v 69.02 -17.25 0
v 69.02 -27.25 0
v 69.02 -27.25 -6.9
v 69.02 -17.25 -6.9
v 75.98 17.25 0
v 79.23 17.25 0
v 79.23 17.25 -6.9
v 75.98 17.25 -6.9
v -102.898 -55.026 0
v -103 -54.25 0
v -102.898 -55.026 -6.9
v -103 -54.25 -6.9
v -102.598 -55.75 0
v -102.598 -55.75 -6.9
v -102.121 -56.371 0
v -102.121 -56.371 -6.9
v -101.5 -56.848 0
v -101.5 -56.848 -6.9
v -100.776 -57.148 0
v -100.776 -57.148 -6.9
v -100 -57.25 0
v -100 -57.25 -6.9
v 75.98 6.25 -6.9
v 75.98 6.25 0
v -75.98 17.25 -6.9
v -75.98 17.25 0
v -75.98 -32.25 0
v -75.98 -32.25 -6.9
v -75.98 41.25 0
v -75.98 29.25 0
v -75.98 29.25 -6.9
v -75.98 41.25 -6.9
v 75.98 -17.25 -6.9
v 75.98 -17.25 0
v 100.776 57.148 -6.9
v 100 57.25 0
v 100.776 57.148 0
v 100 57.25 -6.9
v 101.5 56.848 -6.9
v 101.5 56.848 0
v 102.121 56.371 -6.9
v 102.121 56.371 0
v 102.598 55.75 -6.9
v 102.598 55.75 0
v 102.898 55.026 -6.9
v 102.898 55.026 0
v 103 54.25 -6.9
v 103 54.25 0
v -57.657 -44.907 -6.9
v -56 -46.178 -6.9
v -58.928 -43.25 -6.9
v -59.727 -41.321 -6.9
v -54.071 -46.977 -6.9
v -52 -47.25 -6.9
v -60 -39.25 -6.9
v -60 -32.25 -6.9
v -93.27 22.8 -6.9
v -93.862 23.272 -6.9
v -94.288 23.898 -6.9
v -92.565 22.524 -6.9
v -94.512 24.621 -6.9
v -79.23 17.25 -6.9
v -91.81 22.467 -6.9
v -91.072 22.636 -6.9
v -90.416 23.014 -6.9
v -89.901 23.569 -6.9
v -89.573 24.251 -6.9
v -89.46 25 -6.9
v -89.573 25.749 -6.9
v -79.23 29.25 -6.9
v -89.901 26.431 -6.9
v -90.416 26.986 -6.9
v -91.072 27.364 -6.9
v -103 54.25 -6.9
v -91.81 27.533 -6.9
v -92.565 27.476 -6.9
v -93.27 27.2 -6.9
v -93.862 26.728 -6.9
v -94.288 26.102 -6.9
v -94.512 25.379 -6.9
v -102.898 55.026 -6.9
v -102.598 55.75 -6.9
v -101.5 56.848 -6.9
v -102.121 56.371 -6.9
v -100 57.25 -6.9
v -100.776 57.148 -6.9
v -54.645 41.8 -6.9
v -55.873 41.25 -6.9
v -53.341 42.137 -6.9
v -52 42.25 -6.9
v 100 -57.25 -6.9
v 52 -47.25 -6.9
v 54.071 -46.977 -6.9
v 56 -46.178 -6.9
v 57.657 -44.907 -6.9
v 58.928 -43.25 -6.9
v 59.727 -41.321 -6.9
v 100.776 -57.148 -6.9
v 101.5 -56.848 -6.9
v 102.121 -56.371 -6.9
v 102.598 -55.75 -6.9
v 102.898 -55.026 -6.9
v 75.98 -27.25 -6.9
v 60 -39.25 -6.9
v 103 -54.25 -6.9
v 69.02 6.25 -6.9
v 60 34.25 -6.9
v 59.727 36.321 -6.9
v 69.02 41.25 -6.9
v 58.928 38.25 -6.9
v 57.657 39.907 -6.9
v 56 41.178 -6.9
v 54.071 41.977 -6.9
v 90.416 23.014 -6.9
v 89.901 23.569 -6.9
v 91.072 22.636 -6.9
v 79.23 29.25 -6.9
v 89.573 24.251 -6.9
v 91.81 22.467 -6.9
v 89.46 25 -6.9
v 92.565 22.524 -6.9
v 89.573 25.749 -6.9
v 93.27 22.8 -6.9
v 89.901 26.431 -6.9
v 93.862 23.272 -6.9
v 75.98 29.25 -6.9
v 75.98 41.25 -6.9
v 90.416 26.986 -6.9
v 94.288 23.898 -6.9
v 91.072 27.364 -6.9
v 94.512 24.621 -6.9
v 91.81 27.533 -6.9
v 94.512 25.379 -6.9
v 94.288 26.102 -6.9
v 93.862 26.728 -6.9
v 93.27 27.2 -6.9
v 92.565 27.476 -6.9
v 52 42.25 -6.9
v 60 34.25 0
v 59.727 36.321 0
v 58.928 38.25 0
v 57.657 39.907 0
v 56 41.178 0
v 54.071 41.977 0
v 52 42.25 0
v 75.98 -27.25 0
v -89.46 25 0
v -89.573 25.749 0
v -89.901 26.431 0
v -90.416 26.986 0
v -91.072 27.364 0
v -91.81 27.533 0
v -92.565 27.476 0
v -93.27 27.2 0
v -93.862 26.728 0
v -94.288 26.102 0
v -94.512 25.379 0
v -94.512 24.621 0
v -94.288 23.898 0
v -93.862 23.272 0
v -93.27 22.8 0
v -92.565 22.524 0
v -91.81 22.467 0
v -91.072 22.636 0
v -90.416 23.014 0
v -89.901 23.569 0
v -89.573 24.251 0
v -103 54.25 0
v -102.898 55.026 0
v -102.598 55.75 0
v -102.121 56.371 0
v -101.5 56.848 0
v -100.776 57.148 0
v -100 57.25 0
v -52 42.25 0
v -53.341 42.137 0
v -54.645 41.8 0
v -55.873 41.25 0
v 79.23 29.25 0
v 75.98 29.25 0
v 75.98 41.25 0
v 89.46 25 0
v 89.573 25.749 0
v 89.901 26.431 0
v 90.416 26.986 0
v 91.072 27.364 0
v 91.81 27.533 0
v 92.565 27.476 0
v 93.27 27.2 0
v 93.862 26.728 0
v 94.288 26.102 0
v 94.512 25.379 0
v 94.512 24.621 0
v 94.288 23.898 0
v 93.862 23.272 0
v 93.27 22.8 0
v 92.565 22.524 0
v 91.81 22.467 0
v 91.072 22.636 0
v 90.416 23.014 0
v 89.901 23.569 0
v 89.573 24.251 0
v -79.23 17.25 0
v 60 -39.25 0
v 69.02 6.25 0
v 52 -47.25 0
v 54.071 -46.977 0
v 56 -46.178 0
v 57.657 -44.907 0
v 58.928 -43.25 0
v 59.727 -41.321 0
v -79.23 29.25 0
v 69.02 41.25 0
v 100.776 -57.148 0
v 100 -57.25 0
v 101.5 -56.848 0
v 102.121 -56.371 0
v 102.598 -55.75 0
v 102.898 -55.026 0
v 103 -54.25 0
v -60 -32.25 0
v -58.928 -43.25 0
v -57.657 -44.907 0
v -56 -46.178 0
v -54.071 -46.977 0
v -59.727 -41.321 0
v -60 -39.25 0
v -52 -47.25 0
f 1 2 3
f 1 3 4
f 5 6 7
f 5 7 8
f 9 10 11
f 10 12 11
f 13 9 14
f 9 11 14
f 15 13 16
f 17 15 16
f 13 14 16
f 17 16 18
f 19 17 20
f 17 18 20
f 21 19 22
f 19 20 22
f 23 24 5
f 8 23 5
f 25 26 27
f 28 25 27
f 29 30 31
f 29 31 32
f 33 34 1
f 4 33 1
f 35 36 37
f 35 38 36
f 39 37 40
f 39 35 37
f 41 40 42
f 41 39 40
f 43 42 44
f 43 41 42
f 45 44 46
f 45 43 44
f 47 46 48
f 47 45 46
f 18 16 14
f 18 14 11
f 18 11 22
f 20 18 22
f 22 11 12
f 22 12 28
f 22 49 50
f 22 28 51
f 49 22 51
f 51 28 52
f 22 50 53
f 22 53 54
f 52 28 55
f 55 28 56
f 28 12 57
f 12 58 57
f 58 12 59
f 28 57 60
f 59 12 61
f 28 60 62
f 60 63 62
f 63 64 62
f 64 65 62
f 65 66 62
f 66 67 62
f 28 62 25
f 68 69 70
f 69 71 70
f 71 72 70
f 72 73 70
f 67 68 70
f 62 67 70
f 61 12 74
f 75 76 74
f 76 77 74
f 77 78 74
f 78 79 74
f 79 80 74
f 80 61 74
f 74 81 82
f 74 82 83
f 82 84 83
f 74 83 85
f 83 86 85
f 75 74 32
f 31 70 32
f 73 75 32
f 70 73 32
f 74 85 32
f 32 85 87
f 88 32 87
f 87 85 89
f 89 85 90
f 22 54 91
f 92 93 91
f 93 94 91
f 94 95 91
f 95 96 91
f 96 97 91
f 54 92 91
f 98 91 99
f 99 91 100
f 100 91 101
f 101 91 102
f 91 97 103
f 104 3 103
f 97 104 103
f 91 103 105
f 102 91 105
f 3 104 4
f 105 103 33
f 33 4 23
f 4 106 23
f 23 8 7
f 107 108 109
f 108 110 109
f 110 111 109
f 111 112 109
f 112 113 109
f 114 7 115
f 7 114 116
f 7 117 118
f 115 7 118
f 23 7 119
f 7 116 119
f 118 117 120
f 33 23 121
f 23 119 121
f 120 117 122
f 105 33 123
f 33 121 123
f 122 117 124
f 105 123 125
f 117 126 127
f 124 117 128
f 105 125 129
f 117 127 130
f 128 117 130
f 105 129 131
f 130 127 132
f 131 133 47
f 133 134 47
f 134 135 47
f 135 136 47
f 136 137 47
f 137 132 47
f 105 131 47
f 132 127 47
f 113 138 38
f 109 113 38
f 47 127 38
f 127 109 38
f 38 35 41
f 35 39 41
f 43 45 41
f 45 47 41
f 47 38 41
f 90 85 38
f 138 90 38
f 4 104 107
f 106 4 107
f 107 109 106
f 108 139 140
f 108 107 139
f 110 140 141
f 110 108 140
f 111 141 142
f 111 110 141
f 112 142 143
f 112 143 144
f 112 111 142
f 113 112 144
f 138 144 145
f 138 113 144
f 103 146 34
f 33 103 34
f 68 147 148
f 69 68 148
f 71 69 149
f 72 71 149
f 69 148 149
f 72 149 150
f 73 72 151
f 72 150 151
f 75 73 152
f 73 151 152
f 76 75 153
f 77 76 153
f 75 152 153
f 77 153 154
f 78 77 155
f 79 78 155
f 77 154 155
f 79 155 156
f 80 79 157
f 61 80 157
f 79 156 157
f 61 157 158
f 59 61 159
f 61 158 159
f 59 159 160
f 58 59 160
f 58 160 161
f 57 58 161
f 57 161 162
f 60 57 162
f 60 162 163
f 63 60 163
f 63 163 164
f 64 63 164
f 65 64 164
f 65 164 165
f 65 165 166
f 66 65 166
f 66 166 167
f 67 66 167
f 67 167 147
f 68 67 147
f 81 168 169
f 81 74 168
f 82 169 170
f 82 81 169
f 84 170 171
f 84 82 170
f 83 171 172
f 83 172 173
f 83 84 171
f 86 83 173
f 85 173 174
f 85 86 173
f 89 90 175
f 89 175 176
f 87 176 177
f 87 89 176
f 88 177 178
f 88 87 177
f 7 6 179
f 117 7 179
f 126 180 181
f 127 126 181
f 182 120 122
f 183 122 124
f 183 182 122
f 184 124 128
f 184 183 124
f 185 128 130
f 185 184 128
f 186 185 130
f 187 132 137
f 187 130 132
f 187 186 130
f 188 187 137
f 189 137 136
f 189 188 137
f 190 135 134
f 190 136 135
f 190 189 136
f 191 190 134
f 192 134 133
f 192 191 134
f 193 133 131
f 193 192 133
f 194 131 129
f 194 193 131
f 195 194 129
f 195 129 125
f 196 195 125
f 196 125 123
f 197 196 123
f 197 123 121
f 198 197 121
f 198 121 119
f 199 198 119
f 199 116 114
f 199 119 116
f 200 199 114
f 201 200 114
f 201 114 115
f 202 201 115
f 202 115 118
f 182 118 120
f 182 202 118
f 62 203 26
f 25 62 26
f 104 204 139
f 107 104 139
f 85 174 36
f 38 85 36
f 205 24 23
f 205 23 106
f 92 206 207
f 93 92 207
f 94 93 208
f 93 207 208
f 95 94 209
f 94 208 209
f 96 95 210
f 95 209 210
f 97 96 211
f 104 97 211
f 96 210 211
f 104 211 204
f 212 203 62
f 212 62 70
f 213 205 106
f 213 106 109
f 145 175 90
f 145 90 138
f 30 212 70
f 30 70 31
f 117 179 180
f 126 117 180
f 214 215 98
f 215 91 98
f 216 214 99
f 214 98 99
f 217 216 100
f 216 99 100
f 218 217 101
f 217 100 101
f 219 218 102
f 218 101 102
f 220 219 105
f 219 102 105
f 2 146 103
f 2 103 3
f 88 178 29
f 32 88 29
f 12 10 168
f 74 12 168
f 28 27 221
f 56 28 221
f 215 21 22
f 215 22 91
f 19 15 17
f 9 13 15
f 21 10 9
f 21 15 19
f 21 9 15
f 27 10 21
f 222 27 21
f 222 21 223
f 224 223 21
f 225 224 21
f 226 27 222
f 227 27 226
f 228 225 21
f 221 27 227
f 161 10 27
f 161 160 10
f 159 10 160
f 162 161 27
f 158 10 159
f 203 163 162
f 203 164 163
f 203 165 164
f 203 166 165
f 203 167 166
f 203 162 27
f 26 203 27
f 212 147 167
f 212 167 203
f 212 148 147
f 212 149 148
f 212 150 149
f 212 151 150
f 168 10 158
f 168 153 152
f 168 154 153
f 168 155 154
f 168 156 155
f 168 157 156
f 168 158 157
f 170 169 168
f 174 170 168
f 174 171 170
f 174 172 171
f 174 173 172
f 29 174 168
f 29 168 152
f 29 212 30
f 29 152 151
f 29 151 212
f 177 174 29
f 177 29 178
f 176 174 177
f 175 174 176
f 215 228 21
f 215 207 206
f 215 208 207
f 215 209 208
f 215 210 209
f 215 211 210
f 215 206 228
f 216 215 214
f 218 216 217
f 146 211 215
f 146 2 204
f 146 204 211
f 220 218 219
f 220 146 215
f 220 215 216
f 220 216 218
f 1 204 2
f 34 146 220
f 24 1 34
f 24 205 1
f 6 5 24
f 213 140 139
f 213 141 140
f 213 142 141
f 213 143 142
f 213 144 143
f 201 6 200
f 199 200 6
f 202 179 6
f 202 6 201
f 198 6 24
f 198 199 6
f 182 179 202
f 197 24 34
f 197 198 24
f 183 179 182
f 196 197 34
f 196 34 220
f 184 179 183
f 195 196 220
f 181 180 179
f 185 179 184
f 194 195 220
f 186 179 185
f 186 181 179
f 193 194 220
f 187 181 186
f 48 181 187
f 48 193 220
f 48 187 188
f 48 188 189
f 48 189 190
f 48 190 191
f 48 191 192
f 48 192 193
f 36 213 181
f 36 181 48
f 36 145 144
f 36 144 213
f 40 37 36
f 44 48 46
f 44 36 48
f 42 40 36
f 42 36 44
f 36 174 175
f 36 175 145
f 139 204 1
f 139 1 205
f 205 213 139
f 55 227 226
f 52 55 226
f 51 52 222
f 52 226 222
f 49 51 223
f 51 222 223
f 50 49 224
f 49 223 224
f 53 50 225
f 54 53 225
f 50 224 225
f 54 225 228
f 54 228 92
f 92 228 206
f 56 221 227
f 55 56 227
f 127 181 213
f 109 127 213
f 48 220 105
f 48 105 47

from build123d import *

# Parameters (mm, degrees)
SKETCH1_W           = 206
SKETCH1_H           = 114.5
BOSS_EXTRUDE1_DEPTH = 6.9
SKETCH2_W           = 120
SKETCH2_H           = 88
CUT_EXTRUDE1_DEPTH  = 119.043095944
FILLET1_R           = 8
SKETCH7_R           = 2.54
CUT_EXTRUDE5_DEPTH  = 119.043095944
SKETCH9_W           = 6.96
SKETCH9_H           = 35
SKETCH9_H_2         = 10
CUT_EXTRUDE7_DEPTH  = 119.043095944
SKETCH11_W          = 3.25
SKETCH11_H          = 12
CUT_EXTRUDE8_DEPTH  = 119.043095944
FILLET2_R           = 3
SKETCH8_R           = 1.775
CUT_EXTRUDE6_DEPTH  = 119.043095944
SKETCH10_W          = 6.8
SKETCH10_H          = 3
BOSS_EXTRUDE3_DEPTH = 6.9
FILLET3_R           = 1.5
CUT_EXTRUDE9_DEPTH  = 120.526869364
CUT_EXTRUDE10_DEPTH = 119.043095944
SKETCH15_R          = 1.775
BOSS_EXTRUDE4_DEPTH = 6.9


with BuildPart() as part:
    # Sketch1 → Boss-Extrude1 (new body)
    with BuildSketch(Plane.XY):
        Rectangle(SKETCH1_W, SKETCH1_H)
    extrude(amount=-BOSS_EXTRUDE1_DEPTH)

    # Sketch2 → Cut-Extrude1 (cut, through all)
    with BuildSketch(Plane.XY):
        with Locations((0, -1.75)):
            Rectangle(SKETCH2_W, SKETCH2_H)
    extrude(amount=-CUT_EXTRUDE1_DEPTH, mode=Mode.SUBTRACT)

    # Fillet1
    fillet1_edges = [part.edges().sort_by_distance(p)[0] for p in [
        (-60, -45.75, -3.45),
        (-60, 42.25, -3.45),
        (60, 42.25, -3.45),
        (60, -45.75, -3.45),
    ]]
    fillet(fillet1_edges, radius=FILLET1_R)

    # Sketch7 → Cut-Extrude5 (cut, through all)
    with BuildSketch(Plane.XY):
        with Locations((-92, 25)):
            Circle(SKETCH7_R)
    cut_extrude5 = extrude(amount=-CUT_EXTRUDE5_DEPTH, mode=Mode.SUBTRACT)

    # Sketch9 → Cut-Extrude7 (cut, through all)
    with BuildSketch(Plane.XY):
        with Locations((-72.5, 23.75)):
            Rectangle(SKETCH9_W, SKETCH9_H)
        with Locations((-72.5, -22.25)):
            Rectangle(SKETCH9_W, SKETCH9_H_2)
    cut_extrude7 = extrude(amount=-CUT_EXTRUDE7_DEPTH, mode=Mode.SUBTRACT)

    # Sketch11 → Cut-Extrude8 (cut, through all)
    with BuildSketch(Plane.XY):
        with Locations((-77.605, 23.25)):
            Rectangle(SKETCH11_W, SKETCH11_H)
    cut_extrude8 = extrude(amount=-CUT_EXTRUDE8_DEPTH, mode=Mode.SUBTRACT)

    # Mirror2: Cut-Extrude5, Cut-Extrude7, Cut-Extrude8 across plane
    add(cut_extrude5.mirror(Plane(origin=(0, 0, 0), x_dir=(0, 0, 1), z_dir=(1, 0, 0))), mode=Mode.SUBTRACT)
    add(cut_extrude7.mirror(Plane(origin=(0, 0, 0), x_dir=(0, 0, 1), z_dir=(1, 0, 0))), mode=Mode.SUBTRACT)
    add(cut_extrude8.mirror(Plane(origin=(0, 0, 0), x_dir=(0, 0, 1), z_dir=(1, 0, 0))), mode=Mode.SUBTRACT)

    # Fillet2
    fillet2_edges = [part.edges().sort_by_distance(p)[0] for p in [
        (-103, 57.25, -3.45),
        (103, 57.25, -3.45),
        (103, -57.25, -3.45),
        (-103, -57.25, -3.45),
    ]]
    fillet(fillet2_edges, radius=FILLET2_R)

    # Sketch8 → Cut-Extrude6 (cut, through all)
    with BuildSketch(Plane.XY):
        with Locations((72, -36.75)):
            Circle(SKETCH8_R)
        with Locations((-72, -36.75)):
            Circle(SKETCH8_R)
    extrude(amount=-CUT_EXTRUDE6_DEPTH, mode=Mode.SUBTRACT)

    # Sketch10 → Boss-Extrude3 (add)
    with BuildSketch(Plane.XY):
        with Locations((-38.4, -58.75)):
            Rectangle(SKETCH10_W, SKETCH10_H)
        with Locations((38.4, -58.75)):
            Rectangle(SKETCH10_W, SKETCH10_H)
    extrude(amount=-BOSS_EXTRUDE3_DEPTH)

    # Fillet3
    fillet3_edges = [part.edges().sort_by_distance(p)[0] for p in [
        (-35, -60.25, -3.45),
        (-41.8, -60.25, -3.45),
        (35, -60.25, -3.45),
        (41.8, -60.25, -3.45),
    ]]
    fillet(fillet3_edges, radius=FILLET3_R)

    # Sketch13 → Cut-Extrude9 (cut, through all)
    with BuildSketch(Plane.XY):
        with BuildLine():
            Line((-40.3, -60.25), (-36.5, -60.25))
            ThreePointArc((-36.5, -60.25), (-35.439339828, -59.810660172), (-35, -58.75))
            Line((-35, -58.75), (-35, -57.25))
            Line((-35, -57.25), (-41.8, -57.25))
            Line((-41.8, -57.25), (-41.8, -58.75))
            ThreePointArc((-41.8, -58.75), (-41.360660172, -59.810660172), (-40.3, -60.25))
        make_face()
        with BuildLine():
            Line((35, -57.25), (35, -58.75))
            ThreePointArc((35, -58.75), (35.439339828, -59.810660172), (36.5, -60.25))
            Line((36.5, -60.25), (40.3, -60.25))
            ThreePointArc((40.3, -60.25), (41.360660172, -59.810660172), (41.8, -58.75))
            Line((41.8, -58.75), (41.8, -57.25))
            Line((41.8, -57.25), (35, -57.25))
        make_face()
        with BuildLine():
            Line((-60, -37.75), (-60, -39.25))
            ThreePointArc((-60, -39.25), (-57.656854249, -44.906854249), (-52, -47.25))
            Line((-52, -47.25), (52, -47.25))
            ThreePointArc((52, -47.25), (57.656854249, -44.906854249), (60, -39.25))
            Line((60, -39.25), (60, -37.75))
            ThreePointArc((60, -37.75), (57.656854249, -43.406854249), (52, -45.75))
            Line((52, -45.75), (-52, -45.75))
            ThreePointArc((-52, -45.75), (-57.656854249, -43.406854249), (-60, -37.75))
        make_face()
    extrude(amount=-CUT_EXTRUDE9_DEPTH, mode=Mode.SUBTRACT)

    # Sketch14 → Cut-Extrude10 (cut, through all)
    with BuildSketch(Plane.XY):
        Polygon((-69.02, 6.25), (-75.98, 6.25), (-75.98, -32.25), (-60, -32.25), (-60, 34.25), (-60, 41.25), (-69.02, 41.25), align=None)
        with BuildLine():
            Line((-55.872983346, 41.25), (-60, 41.25))
            Line((-60, 41.25), (-60, 34.25))
            ThreePointArc((-60, 34.25), (-58.891439137, 38.313012013), (-55.872983346, 41.25))
        make_face()
    extrude(amount=-CUT_EXTRUDE10_DEPTH, mode=Mode.SUBTRACT)

    # Sketch15 → Boss-Extrude4 (add)
    with BuildSketch(Plane.XY):
        with Locations((72, -36.75)):
            Circle(SKETCH15_R)
        with Locations((-72, -36.75)):
            Circle(SKETCH15_R)
    extrude(amount=-BOSS_EXTRUDE4_DEPTH)


solid = part.part
